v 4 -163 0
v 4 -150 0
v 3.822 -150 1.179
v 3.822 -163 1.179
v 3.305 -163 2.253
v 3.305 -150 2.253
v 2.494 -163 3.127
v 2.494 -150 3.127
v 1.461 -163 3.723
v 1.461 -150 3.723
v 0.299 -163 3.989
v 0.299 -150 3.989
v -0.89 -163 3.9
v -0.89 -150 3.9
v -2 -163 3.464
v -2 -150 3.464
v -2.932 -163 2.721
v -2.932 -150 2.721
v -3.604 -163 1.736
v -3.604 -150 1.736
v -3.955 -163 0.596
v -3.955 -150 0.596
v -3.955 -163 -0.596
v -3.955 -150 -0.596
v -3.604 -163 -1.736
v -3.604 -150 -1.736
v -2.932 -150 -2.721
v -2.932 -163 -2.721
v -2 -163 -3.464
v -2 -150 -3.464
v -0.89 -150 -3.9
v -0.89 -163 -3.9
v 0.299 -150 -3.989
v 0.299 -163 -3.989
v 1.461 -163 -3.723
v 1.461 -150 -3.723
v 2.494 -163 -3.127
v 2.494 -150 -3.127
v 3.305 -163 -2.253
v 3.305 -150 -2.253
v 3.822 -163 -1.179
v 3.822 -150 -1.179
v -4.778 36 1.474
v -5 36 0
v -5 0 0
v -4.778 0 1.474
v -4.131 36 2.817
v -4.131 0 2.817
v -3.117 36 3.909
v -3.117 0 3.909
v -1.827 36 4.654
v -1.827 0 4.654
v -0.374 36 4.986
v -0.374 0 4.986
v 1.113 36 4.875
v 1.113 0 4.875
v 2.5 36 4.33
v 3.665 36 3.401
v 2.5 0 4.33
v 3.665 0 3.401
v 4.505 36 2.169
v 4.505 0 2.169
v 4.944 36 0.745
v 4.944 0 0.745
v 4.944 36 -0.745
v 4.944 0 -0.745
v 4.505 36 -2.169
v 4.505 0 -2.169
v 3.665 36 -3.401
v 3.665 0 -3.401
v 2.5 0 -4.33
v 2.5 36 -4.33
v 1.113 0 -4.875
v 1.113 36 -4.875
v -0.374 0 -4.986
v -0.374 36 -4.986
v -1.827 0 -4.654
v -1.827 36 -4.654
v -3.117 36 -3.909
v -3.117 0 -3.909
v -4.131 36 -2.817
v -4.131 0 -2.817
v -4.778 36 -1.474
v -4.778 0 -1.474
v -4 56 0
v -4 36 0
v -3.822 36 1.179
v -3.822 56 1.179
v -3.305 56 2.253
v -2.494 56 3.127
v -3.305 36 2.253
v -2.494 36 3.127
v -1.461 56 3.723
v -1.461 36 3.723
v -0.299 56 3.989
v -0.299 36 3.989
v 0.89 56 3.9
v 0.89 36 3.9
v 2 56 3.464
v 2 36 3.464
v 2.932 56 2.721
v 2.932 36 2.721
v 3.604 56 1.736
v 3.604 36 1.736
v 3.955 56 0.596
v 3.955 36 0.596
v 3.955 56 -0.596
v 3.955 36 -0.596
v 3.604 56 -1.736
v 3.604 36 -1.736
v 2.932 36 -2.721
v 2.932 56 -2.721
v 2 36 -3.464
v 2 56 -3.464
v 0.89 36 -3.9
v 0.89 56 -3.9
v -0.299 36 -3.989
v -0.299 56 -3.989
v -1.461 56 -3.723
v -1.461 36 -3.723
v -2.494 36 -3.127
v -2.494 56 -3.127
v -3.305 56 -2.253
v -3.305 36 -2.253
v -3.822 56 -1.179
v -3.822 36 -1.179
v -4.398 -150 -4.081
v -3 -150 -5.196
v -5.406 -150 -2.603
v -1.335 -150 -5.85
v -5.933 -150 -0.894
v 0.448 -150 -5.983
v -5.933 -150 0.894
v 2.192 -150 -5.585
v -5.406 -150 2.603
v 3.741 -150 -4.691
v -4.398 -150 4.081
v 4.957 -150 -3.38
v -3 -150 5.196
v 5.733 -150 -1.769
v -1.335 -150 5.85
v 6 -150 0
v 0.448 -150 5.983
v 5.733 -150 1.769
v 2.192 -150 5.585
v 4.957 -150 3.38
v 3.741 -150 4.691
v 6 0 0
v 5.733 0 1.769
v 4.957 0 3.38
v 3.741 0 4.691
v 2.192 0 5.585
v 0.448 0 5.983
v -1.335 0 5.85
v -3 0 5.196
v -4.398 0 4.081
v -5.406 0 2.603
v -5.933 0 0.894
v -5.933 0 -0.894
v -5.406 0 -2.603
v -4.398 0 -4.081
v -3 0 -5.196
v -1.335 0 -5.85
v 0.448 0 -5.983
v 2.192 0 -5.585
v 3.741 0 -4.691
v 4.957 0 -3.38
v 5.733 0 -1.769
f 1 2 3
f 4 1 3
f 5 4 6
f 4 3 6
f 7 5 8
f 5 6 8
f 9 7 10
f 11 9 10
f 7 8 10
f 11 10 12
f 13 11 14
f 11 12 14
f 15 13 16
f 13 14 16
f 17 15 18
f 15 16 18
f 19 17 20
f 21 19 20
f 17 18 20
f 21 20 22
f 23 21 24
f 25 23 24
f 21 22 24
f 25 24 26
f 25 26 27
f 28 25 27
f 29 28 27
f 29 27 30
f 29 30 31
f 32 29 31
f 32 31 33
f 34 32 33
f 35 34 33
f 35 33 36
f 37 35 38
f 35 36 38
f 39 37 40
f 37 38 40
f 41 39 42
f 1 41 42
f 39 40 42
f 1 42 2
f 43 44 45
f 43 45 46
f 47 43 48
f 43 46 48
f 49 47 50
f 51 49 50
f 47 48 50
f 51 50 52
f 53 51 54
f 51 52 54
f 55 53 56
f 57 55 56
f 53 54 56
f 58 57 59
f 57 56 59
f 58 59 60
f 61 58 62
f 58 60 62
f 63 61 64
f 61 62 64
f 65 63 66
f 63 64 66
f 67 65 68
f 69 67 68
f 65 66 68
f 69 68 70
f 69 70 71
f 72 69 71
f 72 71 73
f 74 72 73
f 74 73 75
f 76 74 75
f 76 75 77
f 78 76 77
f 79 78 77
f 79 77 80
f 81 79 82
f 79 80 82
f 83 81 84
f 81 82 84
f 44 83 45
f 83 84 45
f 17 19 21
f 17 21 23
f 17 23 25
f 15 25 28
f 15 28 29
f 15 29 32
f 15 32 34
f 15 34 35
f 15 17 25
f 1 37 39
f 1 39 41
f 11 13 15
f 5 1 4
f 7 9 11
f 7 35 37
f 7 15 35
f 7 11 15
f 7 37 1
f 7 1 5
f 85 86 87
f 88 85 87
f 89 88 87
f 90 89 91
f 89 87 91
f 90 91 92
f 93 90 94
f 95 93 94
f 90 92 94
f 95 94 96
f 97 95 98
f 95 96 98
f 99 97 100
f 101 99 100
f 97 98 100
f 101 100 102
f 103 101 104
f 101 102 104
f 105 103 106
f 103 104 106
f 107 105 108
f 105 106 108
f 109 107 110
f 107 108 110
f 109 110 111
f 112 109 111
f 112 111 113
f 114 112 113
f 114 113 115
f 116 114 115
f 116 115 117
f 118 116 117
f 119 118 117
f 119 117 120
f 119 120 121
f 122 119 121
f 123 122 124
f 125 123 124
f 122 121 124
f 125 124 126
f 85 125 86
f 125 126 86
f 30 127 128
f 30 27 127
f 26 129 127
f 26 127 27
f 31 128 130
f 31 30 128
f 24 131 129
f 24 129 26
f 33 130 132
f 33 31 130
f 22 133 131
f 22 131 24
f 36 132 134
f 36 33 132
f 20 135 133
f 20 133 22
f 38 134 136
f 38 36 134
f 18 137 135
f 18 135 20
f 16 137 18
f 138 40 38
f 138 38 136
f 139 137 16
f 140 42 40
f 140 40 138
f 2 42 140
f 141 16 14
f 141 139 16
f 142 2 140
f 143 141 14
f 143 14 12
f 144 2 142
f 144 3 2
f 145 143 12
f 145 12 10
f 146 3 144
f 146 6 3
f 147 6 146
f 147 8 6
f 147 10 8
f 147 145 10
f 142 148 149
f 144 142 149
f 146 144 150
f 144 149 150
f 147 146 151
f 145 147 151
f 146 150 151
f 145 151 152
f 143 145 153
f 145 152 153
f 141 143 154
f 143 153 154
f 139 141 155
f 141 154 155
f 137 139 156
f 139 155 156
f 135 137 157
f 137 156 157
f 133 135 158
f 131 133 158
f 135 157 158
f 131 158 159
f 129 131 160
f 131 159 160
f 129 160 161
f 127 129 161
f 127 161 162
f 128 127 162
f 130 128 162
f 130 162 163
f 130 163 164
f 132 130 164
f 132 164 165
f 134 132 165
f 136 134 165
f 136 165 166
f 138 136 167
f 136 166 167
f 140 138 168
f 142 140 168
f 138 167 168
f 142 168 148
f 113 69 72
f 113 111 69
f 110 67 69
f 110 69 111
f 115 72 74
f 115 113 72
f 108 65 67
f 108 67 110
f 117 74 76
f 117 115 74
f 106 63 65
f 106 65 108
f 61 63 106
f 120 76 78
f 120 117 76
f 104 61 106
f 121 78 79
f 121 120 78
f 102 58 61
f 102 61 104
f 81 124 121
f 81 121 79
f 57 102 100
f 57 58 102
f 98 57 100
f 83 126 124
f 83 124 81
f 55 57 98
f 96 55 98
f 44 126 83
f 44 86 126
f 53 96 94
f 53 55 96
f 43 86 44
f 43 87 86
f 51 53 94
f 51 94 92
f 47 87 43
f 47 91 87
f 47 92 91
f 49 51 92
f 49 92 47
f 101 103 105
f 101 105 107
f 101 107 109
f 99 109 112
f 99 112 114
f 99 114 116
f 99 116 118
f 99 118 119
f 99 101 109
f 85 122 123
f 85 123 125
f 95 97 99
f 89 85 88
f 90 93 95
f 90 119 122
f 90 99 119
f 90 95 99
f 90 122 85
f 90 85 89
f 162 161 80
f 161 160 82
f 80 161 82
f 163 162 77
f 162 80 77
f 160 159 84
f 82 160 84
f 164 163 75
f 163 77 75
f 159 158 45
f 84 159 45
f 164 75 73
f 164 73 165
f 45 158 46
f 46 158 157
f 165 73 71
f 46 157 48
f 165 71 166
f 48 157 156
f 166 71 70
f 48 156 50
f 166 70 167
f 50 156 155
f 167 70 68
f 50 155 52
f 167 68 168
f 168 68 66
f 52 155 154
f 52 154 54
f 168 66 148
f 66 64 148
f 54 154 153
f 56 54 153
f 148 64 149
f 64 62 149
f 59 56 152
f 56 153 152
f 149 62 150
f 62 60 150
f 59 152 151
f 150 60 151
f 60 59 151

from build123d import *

# Parameters (mm, degrees)
F0_R     = 6
F1_DEPTH = 150
F2_R     = 5
F3_DEPTH = 36
F4_R     = 4
F5_DEPTH = 20
F6_R     = 4
F7_DEPTH = 13


with BuildPart() as f1:
    # F0 (on Front) → F1 (new body)
    with BuildSketch(Plane.XZ):
        Circle(F0_R)
    extrude(amount=F1_DEPTH)

    # F2 (on face) → F3 (join)
    with BuildSketch(Plane(origin=(0, 0, 0), x_dir=(-1, 0, 0), z_dir=(0, 1, 0))):
        Circle(F2_R)
    extrude(amount=F3_DEPTH)

    # F4 (on face) → F5 (join)
    with BuildSketch(Plane(origin=(0, 36, 0), x_dir=(-1, 0, 0), z_dir=(0, 1, 0))):
        Circle(F4_R)
    extrude(amount=F5_DEPTH)

    # F6 (on face) → F7 (join)
    with BuildSketch(Plane.XZ.offset(150)):
        Circle(F6_R)
    extrude(amount=F7_DEPTH)


solid = f1.part
